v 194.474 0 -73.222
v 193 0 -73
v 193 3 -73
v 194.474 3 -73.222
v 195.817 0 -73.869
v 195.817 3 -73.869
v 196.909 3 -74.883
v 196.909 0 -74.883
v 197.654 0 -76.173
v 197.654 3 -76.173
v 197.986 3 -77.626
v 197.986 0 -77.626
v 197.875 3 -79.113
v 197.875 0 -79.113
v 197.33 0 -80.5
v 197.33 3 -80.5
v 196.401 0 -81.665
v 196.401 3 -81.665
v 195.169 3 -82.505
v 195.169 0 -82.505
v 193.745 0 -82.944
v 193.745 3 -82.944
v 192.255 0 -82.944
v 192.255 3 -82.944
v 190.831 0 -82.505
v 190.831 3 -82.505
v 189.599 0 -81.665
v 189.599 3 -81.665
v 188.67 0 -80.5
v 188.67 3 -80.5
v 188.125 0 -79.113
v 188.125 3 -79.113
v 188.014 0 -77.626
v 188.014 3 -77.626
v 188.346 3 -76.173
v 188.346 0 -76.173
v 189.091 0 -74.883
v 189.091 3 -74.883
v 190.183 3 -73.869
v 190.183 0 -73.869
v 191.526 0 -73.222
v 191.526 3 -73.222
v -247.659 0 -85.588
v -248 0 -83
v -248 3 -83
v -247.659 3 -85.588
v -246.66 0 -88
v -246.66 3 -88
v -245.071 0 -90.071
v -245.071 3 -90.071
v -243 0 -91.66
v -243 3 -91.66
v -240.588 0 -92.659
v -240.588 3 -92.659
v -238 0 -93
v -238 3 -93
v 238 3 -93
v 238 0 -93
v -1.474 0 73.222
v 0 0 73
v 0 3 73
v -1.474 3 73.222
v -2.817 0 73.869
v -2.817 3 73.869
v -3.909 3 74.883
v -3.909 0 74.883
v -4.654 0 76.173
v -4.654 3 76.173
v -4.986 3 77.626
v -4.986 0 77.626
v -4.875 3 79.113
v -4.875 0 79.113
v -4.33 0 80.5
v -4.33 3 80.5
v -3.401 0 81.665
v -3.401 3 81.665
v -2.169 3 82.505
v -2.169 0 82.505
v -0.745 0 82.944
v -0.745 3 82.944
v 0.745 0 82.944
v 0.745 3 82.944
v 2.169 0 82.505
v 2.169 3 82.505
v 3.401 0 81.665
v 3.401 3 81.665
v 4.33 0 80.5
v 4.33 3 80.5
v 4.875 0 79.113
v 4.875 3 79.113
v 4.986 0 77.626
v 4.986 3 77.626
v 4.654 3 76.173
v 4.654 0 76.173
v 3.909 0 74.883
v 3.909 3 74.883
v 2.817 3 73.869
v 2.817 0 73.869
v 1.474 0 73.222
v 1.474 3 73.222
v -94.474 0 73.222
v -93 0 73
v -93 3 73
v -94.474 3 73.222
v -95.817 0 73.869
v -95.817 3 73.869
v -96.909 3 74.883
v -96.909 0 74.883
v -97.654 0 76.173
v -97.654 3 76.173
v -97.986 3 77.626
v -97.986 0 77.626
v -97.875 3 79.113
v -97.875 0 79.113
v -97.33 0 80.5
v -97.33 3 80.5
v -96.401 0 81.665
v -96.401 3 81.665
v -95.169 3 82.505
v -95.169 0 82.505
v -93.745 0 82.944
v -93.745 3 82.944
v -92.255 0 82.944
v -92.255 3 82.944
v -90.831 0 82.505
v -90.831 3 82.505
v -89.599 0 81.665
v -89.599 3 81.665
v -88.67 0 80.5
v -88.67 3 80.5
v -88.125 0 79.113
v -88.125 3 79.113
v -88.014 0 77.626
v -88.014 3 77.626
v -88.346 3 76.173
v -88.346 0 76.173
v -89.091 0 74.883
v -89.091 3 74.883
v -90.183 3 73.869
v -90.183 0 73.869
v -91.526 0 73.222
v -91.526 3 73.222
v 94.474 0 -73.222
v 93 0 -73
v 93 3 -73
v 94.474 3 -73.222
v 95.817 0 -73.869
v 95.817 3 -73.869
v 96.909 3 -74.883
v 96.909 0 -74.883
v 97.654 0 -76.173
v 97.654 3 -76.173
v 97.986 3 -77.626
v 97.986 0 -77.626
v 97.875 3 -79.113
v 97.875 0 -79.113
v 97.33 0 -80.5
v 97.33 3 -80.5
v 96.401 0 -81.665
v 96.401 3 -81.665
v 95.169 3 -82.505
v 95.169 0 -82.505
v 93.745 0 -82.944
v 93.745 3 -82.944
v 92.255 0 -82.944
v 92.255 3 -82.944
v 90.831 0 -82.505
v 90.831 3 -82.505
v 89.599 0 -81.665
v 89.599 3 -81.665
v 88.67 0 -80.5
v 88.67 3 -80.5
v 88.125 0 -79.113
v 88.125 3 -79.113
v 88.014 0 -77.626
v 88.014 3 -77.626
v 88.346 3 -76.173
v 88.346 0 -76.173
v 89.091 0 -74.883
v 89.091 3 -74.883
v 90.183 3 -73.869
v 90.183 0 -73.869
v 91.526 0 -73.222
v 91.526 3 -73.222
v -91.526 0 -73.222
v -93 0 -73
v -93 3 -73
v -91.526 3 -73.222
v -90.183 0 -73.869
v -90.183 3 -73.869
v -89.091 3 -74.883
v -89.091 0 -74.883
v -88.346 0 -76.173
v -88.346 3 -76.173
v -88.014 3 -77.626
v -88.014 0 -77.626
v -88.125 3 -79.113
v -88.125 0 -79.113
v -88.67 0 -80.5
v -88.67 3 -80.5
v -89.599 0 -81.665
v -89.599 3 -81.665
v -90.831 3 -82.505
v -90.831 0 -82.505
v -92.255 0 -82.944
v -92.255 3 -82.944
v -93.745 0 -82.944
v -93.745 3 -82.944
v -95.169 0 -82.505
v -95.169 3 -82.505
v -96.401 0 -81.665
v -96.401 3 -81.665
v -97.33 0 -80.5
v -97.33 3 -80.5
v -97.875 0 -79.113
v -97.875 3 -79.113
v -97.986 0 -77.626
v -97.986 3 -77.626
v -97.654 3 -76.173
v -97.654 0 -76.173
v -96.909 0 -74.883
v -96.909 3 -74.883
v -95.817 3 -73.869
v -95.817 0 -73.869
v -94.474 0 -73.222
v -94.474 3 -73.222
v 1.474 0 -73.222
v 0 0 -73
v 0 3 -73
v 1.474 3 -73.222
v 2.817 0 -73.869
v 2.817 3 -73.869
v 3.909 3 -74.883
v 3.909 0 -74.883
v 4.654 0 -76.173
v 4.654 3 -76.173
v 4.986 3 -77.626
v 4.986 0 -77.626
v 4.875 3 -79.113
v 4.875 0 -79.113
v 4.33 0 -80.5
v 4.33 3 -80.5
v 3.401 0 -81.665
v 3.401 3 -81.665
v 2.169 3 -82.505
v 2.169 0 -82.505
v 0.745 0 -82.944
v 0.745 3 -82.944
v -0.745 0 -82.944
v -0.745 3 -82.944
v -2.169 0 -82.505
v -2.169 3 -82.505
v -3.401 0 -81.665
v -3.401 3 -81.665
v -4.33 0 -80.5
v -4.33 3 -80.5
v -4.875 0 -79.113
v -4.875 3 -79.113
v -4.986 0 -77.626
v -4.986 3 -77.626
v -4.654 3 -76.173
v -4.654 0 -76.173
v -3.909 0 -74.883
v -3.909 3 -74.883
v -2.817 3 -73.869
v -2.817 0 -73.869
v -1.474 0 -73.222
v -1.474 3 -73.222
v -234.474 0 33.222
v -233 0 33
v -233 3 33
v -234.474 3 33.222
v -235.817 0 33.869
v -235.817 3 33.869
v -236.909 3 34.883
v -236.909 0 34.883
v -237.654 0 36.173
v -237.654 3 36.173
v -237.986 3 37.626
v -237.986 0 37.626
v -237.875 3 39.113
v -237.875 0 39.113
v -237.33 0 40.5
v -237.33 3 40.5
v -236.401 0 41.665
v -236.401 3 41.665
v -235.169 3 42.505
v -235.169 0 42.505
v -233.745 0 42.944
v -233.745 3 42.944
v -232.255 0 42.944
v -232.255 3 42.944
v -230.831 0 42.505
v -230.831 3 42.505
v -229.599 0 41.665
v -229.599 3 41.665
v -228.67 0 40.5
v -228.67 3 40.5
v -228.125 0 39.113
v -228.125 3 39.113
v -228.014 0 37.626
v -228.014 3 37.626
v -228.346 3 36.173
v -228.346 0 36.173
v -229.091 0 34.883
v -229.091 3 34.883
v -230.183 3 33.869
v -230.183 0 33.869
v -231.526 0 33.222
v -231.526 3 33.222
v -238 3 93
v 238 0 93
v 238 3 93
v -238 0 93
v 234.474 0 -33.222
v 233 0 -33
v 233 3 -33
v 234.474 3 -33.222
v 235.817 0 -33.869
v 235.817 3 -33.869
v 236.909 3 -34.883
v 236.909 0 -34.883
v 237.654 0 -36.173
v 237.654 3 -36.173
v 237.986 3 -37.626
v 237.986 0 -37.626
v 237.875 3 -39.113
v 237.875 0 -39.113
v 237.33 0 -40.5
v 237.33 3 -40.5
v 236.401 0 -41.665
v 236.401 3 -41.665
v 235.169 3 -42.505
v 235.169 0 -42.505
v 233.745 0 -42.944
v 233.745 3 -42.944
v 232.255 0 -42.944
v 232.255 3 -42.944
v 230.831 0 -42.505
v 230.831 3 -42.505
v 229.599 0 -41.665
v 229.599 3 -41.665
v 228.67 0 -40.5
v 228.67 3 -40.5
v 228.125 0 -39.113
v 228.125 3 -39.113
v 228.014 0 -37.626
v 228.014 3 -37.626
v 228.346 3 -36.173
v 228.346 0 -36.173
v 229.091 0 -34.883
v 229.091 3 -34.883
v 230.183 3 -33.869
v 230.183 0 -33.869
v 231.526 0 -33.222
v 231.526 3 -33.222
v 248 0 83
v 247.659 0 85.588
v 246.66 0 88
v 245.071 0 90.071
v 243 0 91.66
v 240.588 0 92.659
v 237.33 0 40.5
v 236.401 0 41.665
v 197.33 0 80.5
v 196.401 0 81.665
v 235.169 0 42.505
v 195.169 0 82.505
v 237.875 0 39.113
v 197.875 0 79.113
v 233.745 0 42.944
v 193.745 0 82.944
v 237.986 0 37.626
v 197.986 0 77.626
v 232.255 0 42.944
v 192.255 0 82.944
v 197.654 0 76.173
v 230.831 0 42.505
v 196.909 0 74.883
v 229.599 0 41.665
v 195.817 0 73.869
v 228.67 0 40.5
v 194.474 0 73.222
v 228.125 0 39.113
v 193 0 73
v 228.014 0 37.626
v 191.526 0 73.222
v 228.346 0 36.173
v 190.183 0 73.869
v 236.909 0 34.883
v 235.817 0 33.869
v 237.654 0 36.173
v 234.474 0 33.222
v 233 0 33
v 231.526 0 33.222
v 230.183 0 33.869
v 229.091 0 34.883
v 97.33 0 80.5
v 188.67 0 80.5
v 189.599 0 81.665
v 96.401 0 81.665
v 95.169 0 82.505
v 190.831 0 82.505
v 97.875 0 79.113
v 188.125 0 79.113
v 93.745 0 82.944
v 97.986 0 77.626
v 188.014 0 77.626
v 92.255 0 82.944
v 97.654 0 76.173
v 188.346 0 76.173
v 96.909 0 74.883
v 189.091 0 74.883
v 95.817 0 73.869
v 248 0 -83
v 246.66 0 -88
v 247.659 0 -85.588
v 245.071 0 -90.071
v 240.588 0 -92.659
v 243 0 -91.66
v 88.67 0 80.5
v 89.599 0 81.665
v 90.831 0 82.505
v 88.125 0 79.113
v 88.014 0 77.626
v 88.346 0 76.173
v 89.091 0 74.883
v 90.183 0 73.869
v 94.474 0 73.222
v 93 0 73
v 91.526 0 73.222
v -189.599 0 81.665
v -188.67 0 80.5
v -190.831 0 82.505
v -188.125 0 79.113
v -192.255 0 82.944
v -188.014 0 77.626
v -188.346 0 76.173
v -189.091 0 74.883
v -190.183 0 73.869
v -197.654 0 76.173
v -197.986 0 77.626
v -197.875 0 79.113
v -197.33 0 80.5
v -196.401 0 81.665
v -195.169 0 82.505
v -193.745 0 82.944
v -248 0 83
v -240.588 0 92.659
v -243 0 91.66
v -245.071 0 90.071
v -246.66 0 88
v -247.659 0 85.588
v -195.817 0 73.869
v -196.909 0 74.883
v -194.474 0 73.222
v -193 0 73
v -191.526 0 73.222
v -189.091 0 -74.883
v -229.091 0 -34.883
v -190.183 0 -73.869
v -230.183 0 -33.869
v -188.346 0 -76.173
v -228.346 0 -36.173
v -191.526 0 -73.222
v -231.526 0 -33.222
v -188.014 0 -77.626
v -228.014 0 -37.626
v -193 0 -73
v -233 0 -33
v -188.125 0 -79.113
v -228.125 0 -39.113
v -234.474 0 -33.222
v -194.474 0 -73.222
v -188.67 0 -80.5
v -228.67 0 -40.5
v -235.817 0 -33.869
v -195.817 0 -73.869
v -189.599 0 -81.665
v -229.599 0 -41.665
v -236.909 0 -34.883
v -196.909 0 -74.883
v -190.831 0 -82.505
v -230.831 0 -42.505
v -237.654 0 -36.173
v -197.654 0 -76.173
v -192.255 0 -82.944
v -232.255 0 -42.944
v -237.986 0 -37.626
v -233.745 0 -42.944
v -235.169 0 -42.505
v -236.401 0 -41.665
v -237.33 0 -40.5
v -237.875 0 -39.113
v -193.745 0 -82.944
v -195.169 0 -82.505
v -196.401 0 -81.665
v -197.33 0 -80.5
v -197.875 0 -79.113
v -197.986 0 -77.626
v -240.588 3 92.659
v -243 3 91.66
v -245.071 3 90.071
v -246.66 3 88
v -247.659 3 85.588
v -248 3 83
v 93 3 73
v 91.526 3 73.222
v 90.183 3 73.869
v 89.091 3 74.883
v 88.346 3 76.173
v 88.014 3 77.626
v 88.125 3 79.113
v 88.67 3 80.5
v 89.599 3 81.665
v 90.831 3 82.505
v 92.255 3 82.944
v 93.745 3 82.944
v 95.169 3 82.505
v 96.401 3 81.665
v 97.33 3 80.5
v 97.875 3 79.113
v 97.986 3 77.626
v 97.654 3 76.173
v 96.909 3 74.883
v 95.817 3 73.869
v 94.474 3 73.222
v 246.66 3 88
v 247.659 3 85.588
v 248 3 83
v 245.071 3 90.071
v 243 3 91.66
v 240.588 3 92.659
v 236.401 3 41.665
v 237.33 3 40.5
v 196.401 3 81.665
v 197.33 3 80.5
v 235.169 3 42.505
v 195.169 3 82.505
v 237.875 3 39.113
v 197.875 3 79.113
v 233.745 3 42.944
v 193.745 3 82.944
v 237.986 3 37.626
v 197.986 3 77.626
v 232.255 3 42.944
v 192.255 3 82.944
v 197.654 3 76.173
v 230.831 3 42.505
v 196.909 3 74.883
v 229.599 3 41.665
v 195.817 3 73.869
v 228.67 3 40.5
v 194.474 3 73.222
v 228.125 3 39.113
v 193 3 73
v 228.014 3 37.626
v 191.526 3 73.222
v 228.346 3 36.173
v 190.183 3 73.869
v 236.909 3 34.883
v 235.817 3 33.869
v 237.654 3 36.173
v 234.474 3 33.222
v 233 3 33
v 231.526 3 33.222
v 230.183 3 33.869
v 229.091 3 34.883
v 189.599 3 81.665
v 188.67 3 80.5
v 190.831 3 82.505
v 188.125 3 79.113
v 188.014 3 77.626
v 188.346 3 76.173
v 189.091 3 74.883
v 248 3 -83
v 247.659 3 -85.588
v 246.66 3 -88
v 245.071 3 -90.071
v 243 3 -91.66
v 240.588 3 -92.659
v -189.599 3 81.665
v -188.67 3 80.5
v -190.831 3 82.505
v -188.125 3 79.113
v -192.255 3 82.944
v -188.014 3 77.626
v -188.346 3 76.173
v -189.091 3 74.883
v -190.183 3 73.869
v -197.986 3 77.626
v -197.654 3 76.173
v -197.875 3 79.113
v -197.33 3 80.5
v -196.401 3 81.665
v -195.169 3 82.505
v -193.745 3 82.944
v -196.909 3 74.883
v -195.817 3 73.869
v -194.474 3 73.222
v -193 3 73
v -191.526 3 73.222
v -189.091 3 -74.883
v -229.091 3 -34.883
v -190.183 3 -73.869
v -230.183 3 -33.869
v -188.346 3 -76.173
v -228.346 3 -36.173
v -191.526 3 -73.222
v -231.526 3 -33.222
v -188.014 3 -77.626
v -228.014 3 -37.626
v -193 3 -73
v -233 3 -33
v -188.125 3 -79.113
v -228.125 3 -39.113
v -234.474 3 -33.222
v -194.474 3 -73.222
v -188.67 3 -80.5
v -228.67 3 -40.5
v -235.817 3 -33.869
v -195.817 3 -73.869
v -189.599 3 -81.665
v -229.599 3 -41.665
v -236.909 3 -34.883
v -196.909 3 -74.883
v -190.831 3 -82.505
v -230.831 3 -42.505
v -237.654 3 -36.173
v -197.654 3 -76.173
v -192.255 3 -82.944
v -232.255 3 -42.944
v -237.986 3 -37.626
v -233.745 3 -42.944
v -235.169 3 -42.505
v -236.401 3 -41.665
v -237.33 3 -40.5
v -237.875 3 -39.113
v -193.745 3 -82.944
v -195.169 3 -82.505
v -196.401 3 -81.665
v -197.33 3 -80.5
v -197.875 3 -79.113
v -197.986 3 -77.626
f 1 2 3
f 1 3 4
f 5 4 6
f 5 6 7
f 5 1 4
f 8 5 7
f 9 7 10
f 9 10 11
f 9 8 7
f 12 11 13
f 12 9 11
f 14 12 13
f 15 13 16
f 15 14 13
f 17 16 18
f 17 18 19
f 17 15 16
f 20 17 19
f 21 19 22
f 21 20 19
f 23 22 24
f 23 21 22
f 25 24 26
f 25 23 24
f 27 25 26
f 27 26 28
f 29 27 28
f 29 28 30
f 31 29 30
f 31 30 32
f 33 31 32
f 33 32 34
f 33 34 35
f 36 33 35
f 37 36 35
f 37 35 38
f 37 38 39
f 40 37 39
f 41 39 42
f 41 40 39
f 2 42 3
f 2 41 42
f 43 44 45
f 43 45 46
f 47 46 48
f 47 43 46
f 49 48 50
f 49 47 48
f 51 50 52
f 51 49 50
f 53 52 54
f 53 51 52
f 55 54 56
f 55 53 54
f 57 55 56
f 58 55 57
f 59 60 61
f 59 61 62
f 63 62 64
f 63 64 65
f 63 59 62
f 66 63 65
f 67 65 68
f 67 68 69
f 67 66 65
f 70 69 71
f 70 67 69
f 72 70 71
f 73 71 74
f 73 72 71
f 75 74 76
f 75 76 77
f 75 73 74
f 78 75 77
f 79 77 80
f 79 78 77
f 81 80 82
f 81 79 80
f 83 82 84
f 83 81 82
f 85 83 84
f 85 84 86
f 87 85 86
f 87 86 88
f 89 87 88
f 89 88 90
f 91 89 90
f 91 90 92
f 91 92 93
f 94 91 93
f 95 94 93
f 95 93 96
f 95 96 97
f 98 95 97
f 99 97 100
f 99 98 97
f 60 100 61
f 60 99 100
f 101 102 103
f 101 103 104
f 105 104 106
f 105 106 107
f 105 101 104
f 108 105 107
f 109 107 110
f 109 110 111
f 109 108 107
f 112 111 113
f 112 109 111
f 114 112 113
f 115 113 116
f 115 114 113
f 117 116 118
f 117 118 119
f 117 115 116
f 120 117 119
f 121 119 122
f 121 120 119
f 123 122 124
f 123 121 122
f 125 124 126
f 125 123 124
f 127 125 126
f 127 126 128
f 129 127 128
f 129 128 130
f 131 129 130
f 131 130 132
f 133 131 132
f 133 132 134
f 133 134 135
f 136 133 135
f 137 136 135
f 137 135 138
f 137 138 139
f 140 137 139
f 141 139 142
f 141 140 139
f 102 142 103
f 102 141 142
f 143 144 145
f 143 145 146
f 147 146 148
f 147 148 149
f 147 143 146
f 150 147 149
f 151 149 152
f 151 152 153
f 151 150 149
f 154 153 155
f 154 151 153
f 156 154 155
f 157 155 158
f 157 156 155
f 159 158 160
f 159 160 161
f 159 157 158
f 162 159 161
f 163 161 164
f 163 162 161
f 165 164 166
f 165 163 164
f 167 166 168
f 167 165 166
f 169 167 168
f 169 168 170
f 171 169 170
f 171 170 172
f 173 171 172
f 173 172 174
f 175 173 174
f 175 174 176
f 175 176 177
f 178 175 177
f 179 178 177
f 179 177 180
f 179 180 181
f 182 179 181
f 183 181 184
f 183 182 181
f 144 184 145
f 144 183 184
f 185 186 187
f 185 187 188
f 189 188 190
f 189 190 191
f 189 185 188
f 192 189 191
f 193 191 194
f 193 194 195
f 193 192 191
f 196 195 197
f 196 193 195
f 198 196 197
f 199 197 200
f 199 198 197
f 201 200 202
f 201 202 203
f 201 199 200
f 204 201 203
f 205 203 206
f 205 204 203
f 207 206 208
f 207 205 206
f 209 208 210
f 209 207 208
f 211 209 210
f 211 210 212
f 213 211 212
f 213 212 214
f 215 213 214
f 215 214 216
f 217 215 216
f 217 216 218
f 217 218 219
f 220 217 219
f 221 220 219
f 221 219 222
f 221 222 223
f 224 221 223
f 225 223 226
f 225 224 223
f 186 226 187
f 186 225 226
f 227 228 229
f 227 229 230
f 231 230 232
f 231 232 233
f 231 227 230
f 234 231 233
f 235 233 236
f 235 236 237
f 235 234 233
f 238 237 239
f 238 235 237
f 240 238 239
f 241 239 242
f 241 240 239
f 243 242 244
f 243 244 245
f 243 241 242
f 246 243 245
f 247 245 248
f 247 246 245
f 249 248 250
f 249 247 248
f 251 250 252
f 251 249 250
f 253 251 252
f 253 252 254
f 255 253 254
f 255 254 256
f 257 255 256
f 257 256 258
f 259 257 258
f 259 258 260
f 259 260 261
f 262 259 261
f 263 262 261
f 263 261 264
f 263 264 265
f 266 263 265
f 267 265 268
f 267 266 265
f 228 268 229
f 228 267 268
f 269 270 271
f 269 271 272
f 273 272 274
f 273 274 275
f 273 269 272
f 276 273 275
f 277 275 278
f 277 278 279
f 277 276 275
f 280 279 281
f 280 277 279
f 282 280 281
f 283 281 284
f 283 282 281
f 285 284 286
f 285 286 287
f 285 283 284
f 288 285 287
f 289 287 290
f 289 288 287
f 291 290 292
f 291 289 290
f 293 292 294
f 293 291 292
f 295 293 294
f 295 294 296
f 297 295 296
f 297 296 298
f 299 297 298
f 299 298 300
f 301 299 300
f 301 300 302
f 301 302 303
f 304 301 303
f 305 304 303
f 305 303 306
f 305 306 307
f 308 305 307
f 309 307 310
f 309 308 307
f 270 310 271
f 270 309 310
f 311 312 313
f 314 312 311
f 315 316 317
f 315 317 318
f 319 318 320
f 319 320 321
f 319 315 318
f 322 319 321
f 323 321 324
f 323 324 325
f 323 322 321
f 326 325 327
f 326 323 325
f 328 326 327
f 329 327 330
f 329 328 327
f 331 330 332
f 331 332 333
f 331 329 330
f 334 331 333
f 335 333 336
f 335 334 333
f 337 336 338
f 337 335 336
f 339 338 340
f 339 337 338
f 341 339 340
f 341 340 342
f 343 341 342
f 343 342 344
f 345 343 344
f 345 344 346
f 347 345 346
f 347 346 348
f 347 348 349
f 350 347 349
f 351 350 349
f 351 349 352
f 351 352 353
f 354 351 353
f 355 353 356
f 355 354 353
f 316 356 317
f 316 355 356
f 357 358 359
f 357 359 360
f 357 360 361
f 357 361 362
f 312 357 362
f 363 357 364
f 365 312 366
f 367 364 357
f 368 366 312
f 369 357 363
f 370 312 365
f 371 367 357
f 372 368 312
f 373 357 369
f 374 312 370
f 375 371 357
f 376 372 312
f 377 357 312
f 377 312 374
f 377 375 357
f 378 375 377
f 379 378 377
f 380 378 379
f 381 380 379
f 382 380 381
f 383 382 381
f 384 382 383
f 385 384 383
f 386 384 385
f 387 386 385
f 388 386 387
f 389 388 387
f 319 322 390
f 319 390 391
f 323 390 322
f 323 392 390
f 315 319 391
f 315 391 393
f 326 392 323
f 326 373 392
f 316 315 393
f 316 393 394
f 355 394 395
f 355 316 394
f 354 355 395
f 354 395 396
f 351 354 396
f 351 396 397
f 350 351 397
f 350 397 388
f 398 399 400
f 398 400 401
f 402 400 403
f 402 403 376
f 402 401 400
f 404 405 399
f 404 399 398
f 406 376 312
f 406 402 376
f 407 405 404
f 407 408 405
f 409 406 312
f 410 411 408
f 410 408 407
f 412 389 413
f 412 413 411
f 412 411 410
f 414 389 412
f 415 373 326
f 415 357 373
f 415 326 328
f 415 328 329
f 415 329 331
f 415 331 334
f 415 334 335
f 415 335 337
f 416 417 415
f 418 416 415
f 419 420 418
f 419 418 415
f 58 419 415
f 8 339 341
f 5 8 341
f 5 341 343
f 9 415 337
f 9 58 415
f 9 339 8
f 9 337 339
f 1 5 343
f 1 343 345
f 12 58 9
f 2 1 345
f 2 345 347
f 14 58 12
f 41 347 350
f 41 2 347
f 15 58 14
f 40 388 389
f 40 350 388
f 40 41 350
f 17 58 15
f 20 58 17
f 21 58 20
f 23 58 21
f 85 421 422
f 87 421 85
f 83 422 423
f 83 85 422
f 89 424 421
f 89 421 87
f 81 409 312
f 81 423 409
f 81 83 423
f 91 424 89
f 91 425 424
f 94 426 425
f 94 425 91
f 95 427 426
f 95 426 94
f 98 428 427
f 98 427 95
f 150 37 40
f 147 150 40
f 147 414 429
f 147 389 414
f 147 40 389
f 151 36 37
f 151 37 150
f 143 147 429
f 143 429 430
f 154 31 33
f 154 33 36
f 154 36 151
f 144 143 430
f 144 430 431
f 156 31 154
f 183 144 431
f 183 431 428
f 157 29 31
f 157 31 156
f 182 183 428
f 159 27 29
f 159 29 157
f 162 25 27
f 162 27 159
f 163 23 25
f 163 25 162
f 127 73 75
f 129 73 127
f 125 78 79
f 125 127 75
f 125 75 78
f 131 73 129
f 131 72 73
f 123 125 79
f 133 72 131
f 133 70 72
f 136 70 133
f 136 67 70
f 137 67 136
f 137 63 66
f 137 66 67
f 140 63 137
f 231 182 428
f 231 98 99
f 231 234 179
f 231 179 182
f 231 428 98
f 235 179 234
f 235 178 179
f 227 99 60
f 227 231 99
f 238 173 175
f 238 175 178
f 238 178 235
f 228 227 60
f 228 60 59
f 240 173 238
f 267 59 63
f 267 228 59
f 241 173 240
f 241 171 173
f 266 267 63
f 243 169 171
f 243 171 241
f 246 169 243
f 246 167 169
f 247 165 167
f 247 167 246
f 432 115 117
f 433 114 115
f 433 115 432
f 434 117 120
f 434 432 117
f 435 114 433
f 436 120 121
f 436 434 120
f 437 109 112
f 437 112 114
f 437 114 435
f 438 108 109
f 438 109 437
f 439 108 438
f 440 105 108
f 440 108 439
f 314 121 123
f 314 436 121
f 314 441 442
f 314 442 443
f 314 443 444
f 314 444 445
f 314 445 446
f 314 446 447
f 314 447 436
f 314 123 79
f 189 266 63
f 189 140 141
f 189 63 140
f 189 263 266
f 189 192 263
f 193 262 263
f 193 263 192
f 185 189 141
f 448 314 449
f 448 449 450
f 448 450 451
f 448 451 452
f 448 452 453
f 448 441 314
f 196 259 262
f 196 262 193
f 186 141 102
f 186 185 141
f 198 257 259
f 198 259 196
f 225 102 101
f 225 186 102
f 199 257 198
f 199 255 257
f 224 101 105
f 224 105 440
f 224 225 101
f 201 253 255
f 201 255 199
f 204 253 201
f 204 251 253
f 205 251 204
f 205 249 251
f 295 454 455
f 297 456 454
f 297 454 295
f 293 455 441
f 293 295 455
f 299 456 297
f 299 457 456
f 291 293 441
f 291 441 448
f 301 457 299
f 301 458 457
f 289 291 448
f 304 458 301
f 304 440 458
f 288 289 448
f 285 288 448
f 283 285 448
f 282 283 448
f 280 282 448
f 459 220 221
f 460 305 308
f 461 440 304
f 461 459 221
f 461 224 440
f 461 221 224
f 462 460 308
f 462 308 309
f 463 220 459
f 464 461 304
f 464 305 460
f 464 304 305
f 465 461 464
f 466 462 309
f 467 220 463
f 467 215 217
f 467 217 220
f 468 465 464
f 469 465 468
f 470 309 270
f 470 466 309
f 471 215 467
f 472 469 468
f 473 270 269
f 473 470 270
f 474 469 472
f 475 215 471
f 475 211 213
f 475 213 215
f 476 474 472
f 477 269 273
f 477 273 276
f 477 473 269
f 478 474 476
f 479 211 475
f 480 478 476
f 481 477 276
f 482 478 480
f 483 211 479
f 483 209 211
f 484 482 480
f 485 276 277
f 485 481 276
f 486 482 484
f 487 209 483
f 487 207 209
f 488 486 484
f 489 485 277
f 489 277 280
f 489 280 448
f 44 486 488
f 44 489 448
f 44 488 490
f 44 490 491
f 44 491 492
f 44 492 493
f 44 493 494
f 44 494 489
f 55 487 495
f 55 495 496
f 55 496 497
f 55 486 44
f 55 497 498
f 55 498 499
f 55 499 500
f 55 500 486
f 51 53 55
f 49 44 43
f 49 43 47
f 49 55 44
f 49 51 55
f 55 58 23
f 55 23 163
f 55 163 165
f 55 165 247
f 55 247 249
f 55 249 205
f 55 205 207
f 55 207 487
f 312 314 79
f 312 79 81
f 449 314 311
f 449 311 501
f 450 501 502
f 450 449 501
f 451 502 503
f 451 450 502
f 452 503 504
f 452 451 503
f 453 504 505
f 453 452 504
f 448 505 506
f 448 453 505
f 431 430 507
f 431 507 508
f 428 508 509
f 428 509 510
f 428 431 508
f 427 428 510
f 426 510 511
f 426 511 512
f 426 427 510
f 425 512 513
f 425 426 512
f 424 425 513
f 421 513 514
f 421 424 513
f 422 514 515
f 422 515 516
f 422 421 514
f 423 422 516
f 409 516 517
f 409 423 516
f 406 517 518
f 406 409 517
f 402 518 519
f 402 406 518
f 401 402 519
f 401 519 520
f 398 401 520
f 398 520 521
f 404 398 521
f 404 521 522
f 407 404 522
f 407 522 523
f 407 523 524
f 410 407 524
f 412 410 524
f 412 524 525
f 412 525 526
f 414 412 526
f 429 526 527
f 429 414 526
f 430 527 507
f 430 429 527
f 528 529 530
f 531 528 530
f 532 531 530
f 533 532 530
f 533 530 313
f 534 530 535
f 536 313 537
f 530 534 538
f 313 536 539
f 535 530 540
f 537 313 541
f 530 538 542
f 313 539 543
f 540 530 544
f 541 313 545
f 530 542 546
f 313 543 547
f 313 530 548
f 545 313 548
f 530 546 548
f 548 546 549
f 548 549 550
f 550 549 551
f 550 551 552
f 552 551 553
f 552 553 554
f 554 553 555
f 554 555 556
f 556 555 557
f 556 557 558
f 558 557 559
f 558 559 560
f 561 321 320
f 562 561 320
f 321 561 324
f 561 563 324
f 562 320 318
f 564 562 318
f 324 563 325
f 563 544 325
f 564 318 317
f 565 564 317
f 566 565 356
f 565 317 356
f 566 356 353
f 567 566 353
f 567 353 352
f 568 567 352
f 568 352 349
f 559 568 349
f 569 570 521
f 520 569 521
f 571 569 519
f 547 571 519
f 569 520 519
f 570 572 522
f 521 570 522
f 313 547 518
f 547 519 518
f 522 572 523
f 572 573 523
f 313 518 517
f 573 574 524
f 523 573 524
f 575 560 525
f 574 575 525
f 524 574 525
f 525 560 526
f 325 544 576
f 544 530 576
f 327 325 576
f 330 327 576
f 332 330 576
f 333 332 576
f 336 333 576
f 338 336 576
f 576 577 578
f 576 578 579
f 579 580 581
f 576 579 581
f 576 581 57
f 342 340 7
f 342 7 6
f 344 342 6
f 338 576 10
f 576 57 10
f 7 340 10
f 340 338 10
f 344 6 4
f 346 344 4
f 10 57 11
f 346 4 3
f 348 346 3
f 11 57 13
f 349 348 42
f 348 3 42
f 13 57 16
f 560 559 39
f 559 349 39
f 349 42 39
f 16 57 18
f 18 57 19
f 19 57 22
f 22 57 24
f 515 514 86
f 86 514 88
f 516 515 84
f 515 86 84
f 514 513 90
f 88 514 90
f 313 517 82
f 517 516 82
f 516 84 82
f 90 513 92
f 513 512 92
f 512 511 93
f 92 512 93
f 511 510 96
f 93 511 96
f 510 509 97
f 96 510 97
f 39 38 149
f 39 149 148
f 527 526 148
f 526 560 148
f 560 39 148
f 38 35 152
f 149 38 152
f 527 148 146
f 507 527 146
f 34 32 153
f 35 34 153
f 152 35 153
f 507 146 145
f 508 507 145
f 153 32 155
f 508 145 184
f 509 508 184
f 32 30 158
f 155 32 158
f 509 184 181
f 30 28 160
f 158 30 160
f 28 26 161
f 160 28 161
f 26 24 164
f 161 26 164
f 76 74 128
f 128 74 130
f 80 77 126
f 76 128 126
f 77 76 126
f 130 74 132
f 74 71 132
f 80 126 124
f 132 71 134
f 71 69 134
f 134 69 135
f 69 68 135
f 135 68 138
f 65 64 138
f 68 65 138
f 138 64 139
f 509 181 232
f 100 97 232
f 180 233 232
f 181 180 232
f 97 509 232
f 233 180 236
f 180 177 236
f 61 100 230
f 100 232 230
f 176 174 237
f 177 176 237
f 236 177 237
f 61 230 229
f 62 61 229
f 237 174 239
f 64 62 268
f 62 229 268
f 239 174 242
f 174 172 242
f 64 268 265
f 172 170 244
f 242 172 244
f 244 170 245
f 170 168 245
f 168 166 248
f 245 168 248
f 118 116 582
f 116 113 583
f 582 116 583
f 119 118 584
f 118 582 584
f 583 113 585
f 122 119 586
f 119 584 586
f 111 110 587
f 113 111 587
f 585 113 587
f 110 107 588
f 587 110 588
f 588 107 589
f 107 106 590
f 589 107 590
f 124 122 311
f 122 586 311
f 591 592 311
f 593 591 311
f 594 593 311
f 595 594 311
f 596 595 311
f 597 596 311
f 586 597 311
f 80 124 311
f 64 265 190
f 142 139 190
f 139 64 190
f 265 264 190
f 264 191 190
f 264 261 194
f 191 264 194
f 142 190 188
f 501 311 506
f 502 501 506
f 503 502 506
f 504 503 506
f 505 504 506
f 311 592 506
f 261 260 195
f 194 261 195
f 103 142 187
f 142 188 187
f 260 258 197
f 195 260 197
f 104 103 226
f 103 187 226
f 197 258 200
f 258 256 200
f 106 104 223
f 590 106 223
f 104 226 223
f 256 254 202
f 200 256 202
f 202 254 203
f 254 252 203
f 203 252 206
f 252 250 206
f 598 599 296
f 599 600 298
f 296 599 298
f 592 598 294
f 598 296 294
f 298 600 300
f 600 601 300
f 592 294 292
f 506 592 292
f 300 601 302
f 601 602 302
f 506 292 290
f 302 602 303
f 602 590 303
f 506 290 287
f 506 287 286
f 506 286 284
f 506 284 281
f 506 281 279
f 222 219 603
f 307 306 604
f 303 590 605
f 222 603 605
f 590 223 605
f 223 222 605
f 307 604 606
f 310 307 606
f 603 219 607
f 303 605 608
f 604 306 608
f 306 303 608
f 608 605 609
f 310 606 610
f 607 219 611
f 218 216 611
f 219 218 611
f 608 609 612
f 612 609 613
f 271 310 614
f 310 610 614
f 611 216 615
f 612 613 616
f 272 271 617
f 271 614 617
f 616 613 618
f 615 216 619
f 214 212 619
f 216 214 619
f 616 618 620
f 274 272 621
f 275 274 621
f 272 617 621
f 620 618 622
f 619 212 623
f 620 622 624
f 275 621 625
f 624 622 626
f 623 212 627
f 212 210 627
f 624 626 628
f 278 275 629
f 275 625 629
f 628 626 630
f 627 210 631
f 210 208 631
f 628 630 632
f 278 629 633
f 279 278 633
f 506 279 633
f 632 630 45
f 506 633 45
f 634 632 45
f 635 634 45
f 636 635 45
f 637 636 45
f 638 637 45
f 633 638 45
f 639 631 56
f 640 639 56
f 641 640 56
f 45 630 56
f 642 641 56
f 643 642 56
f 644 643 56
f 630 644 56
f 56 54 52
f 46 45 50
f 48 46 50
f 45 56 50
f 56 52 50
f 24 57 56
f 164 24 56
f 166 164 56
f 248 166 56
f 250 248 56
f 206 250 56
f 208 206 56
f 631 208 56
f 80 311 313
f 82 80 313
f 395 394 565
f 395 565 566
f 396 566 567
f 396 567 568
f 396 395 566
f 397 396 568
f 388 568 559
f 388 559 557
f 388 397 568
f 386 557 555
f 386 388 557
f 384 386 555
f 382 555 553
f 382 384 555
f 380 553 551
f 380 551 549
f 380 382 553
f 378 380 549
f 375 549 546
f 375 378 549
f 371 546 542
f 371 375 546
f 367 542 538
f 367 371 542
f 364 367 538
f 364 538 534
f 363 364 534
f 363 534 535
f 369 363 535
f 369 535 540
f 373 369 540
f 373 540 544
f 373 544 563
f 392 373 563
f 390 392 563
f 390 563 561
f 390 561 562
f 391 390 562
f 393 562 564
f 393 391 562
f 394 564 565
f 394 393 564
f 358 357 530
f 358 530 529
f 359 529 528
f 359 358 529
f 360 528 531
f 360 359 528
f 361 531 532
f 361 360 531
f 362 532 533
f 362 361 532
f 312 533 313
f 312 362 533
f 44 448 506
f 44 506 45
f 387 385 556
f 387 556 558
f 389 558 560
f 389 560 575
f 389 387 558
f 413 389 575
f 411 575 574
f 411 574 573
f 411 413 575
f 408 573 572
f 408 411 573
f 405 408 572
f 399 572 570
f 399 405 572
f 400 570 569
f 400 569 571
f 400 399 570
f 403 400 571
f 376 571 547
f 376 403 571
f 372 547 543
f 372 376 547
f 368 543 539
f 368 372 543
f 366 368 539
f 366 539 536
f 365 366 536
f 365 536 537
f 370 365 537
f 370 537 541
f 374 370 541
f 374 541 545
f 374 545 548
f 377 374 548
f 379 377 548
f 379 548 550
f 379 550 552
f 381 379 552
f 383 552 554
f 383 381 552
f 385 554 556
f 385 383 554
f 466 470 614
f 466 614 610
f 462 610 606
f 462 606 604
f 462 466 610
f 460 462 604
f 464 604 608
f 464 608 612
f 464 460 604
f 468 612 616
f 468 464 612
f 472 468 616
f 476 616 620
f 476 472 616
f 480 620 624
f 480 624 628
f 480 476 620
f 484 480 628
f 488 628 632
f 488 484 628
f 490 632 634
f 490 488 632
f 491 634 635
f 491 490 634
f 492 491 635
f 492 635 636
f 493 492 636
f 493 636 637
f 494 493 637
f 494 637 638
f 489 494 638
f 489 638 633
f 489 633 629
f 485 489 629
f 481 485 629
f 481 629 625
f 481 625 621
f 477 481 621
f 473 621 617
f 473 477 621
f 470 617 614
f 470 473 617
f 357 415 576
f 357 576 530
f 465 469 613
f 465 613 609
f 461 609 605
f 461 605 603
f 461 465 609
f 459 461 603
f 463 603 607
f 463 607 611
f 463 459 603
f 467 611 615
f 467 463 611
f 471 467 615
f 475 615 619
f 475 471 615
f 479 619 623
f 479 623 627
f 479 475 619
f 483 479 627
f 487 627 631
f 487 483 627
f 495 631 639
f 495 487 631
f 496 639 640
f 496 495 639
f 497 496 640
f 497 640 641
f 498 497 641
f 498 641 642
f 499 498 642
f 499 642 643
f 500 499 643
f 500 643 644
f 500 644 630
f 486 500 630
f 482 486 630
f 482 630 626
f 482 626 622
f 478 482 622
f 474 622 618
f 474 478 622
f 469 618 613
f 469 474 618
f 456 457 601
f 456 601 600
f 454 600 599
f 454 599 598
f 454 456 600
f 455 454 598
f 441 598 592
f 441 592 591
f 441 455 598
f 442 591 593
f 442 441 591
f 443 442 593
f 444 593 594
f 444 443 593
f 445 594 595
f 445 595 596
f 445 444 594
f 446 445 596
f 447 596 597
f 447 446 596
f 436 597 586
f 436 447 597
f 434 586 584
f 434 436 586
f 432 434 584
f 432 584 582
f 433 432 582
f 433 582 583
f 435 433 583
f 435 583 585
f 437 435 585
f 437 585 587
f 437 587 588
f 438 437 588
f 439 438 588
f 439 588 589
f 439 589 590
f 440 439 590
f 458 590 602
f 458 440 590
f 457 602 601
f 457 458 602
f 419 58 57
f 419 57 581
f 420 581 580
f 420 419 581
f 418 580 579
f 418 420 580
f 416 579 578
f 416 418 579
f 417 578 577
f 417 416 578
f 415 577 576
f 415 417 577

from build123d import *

# Parameters (mm, degrees)
SKETCH1_R           = 5
BOSS_EXTRUDE1_DEPTH = 3


with BuildPart() as part:
    # Sketch1 → Boss-Extrude1 (new body)
    with BuildSketch(Plane(origin=(0, 0, 0), x_dir=(1, 0, 0), z_dir=(0, 1, 0))):
        with BuildLine():
            Line((-238, 93), (238, 93))
            ThreePointArc((238, 93), (245.071067812, 90.071067812), (248, 83))
            Line((248, 83), (248, -83))
            ThreePointArc((248, -83), (245.071067812, -90.071067812), (238, -93))
            Line((238, -93), (-238, -93))
            ThreePointArc((-238, -93), (-245.071067812, -90.071067812), (-248, -83))
            Line((-248, -83), (-248, 83))
            ThreePointArc((-248, 83), (-245.071067812, 90.071067812), (-238, 93))
        make_face()
        with Locations(Location((-193, 78, 0), (0, 0, 270))):
            Circle(SKETCH1_R, mode=Mode.SUBTRACT)
        with Locations(Location((-93, 78, 0), (0, 0, 270))):
            Circle(SKETCH1_R, mode=Mode.SUBTRACT)
        with Locations(Location((0, 78, 0), (0, 0, 270))):
            Circle(SKETCH1_R, mode=Mode.SUBTRACT)
        with Locations(Location((-233, 38, 0), (0, 0, 270))):
            Circle(SKETCH1_R, mode=Mode.SUBTRACT)
        with Locations(Location((93, 78, 0), (0, 0, 270))):
            Circle(SKETCH1_R, mode=Mode.SUBTRACT)
        with Locations(Location((193, 78, 0), (0, 0, 270))):
            Circle(SKETCH1_R, mode=Mode.SUBTRACT)
        with Locations(Location((233, 38, 0), (0, 0, 270))):
            Circle(SKETCH1_R, mode=Mode.SUBTRACT)
        with Locations(Location((233, -38, 0), (0, 0, 90))):
            Circle(SKETCH1_R, mode=Mode.SUBTRACT)
        with Locations(Location((193, -78, 0), (0, 0, 90))):
            Circle(SKETCH1_R, mode=Mode.SUBTRACT)
        with Locations(Location((93, -78, 0), (0, 0, 90))):
            Circle(SKETCH1_R, mode=Mode.SUBTRACT)
        with Locations(Location((0, -78, 0), (0, 0, 90))):
            Circle(SKETCH1_R, mode=Mode.SUBTRACT)
        with Locations(Location((-93, -78, 0), (0, 0, 90))):
            Circle(SKETCH1_R, mode=Mode.SUBTRACT)
        with Locations(Location((-193, -78, 0), (0, 0, 90))):
            Circle(SKETCH1_R, mode=Mode.SUBTRACT)
        with Locations(Location((-233, -38, 0), (0, 0, 90))):
            Circle(SKETCH1_R, mode=Mode.SUBTRACT)
    extrude(amount=BOSS_EXTRUDE1_DEPTH)


solid = part.part
